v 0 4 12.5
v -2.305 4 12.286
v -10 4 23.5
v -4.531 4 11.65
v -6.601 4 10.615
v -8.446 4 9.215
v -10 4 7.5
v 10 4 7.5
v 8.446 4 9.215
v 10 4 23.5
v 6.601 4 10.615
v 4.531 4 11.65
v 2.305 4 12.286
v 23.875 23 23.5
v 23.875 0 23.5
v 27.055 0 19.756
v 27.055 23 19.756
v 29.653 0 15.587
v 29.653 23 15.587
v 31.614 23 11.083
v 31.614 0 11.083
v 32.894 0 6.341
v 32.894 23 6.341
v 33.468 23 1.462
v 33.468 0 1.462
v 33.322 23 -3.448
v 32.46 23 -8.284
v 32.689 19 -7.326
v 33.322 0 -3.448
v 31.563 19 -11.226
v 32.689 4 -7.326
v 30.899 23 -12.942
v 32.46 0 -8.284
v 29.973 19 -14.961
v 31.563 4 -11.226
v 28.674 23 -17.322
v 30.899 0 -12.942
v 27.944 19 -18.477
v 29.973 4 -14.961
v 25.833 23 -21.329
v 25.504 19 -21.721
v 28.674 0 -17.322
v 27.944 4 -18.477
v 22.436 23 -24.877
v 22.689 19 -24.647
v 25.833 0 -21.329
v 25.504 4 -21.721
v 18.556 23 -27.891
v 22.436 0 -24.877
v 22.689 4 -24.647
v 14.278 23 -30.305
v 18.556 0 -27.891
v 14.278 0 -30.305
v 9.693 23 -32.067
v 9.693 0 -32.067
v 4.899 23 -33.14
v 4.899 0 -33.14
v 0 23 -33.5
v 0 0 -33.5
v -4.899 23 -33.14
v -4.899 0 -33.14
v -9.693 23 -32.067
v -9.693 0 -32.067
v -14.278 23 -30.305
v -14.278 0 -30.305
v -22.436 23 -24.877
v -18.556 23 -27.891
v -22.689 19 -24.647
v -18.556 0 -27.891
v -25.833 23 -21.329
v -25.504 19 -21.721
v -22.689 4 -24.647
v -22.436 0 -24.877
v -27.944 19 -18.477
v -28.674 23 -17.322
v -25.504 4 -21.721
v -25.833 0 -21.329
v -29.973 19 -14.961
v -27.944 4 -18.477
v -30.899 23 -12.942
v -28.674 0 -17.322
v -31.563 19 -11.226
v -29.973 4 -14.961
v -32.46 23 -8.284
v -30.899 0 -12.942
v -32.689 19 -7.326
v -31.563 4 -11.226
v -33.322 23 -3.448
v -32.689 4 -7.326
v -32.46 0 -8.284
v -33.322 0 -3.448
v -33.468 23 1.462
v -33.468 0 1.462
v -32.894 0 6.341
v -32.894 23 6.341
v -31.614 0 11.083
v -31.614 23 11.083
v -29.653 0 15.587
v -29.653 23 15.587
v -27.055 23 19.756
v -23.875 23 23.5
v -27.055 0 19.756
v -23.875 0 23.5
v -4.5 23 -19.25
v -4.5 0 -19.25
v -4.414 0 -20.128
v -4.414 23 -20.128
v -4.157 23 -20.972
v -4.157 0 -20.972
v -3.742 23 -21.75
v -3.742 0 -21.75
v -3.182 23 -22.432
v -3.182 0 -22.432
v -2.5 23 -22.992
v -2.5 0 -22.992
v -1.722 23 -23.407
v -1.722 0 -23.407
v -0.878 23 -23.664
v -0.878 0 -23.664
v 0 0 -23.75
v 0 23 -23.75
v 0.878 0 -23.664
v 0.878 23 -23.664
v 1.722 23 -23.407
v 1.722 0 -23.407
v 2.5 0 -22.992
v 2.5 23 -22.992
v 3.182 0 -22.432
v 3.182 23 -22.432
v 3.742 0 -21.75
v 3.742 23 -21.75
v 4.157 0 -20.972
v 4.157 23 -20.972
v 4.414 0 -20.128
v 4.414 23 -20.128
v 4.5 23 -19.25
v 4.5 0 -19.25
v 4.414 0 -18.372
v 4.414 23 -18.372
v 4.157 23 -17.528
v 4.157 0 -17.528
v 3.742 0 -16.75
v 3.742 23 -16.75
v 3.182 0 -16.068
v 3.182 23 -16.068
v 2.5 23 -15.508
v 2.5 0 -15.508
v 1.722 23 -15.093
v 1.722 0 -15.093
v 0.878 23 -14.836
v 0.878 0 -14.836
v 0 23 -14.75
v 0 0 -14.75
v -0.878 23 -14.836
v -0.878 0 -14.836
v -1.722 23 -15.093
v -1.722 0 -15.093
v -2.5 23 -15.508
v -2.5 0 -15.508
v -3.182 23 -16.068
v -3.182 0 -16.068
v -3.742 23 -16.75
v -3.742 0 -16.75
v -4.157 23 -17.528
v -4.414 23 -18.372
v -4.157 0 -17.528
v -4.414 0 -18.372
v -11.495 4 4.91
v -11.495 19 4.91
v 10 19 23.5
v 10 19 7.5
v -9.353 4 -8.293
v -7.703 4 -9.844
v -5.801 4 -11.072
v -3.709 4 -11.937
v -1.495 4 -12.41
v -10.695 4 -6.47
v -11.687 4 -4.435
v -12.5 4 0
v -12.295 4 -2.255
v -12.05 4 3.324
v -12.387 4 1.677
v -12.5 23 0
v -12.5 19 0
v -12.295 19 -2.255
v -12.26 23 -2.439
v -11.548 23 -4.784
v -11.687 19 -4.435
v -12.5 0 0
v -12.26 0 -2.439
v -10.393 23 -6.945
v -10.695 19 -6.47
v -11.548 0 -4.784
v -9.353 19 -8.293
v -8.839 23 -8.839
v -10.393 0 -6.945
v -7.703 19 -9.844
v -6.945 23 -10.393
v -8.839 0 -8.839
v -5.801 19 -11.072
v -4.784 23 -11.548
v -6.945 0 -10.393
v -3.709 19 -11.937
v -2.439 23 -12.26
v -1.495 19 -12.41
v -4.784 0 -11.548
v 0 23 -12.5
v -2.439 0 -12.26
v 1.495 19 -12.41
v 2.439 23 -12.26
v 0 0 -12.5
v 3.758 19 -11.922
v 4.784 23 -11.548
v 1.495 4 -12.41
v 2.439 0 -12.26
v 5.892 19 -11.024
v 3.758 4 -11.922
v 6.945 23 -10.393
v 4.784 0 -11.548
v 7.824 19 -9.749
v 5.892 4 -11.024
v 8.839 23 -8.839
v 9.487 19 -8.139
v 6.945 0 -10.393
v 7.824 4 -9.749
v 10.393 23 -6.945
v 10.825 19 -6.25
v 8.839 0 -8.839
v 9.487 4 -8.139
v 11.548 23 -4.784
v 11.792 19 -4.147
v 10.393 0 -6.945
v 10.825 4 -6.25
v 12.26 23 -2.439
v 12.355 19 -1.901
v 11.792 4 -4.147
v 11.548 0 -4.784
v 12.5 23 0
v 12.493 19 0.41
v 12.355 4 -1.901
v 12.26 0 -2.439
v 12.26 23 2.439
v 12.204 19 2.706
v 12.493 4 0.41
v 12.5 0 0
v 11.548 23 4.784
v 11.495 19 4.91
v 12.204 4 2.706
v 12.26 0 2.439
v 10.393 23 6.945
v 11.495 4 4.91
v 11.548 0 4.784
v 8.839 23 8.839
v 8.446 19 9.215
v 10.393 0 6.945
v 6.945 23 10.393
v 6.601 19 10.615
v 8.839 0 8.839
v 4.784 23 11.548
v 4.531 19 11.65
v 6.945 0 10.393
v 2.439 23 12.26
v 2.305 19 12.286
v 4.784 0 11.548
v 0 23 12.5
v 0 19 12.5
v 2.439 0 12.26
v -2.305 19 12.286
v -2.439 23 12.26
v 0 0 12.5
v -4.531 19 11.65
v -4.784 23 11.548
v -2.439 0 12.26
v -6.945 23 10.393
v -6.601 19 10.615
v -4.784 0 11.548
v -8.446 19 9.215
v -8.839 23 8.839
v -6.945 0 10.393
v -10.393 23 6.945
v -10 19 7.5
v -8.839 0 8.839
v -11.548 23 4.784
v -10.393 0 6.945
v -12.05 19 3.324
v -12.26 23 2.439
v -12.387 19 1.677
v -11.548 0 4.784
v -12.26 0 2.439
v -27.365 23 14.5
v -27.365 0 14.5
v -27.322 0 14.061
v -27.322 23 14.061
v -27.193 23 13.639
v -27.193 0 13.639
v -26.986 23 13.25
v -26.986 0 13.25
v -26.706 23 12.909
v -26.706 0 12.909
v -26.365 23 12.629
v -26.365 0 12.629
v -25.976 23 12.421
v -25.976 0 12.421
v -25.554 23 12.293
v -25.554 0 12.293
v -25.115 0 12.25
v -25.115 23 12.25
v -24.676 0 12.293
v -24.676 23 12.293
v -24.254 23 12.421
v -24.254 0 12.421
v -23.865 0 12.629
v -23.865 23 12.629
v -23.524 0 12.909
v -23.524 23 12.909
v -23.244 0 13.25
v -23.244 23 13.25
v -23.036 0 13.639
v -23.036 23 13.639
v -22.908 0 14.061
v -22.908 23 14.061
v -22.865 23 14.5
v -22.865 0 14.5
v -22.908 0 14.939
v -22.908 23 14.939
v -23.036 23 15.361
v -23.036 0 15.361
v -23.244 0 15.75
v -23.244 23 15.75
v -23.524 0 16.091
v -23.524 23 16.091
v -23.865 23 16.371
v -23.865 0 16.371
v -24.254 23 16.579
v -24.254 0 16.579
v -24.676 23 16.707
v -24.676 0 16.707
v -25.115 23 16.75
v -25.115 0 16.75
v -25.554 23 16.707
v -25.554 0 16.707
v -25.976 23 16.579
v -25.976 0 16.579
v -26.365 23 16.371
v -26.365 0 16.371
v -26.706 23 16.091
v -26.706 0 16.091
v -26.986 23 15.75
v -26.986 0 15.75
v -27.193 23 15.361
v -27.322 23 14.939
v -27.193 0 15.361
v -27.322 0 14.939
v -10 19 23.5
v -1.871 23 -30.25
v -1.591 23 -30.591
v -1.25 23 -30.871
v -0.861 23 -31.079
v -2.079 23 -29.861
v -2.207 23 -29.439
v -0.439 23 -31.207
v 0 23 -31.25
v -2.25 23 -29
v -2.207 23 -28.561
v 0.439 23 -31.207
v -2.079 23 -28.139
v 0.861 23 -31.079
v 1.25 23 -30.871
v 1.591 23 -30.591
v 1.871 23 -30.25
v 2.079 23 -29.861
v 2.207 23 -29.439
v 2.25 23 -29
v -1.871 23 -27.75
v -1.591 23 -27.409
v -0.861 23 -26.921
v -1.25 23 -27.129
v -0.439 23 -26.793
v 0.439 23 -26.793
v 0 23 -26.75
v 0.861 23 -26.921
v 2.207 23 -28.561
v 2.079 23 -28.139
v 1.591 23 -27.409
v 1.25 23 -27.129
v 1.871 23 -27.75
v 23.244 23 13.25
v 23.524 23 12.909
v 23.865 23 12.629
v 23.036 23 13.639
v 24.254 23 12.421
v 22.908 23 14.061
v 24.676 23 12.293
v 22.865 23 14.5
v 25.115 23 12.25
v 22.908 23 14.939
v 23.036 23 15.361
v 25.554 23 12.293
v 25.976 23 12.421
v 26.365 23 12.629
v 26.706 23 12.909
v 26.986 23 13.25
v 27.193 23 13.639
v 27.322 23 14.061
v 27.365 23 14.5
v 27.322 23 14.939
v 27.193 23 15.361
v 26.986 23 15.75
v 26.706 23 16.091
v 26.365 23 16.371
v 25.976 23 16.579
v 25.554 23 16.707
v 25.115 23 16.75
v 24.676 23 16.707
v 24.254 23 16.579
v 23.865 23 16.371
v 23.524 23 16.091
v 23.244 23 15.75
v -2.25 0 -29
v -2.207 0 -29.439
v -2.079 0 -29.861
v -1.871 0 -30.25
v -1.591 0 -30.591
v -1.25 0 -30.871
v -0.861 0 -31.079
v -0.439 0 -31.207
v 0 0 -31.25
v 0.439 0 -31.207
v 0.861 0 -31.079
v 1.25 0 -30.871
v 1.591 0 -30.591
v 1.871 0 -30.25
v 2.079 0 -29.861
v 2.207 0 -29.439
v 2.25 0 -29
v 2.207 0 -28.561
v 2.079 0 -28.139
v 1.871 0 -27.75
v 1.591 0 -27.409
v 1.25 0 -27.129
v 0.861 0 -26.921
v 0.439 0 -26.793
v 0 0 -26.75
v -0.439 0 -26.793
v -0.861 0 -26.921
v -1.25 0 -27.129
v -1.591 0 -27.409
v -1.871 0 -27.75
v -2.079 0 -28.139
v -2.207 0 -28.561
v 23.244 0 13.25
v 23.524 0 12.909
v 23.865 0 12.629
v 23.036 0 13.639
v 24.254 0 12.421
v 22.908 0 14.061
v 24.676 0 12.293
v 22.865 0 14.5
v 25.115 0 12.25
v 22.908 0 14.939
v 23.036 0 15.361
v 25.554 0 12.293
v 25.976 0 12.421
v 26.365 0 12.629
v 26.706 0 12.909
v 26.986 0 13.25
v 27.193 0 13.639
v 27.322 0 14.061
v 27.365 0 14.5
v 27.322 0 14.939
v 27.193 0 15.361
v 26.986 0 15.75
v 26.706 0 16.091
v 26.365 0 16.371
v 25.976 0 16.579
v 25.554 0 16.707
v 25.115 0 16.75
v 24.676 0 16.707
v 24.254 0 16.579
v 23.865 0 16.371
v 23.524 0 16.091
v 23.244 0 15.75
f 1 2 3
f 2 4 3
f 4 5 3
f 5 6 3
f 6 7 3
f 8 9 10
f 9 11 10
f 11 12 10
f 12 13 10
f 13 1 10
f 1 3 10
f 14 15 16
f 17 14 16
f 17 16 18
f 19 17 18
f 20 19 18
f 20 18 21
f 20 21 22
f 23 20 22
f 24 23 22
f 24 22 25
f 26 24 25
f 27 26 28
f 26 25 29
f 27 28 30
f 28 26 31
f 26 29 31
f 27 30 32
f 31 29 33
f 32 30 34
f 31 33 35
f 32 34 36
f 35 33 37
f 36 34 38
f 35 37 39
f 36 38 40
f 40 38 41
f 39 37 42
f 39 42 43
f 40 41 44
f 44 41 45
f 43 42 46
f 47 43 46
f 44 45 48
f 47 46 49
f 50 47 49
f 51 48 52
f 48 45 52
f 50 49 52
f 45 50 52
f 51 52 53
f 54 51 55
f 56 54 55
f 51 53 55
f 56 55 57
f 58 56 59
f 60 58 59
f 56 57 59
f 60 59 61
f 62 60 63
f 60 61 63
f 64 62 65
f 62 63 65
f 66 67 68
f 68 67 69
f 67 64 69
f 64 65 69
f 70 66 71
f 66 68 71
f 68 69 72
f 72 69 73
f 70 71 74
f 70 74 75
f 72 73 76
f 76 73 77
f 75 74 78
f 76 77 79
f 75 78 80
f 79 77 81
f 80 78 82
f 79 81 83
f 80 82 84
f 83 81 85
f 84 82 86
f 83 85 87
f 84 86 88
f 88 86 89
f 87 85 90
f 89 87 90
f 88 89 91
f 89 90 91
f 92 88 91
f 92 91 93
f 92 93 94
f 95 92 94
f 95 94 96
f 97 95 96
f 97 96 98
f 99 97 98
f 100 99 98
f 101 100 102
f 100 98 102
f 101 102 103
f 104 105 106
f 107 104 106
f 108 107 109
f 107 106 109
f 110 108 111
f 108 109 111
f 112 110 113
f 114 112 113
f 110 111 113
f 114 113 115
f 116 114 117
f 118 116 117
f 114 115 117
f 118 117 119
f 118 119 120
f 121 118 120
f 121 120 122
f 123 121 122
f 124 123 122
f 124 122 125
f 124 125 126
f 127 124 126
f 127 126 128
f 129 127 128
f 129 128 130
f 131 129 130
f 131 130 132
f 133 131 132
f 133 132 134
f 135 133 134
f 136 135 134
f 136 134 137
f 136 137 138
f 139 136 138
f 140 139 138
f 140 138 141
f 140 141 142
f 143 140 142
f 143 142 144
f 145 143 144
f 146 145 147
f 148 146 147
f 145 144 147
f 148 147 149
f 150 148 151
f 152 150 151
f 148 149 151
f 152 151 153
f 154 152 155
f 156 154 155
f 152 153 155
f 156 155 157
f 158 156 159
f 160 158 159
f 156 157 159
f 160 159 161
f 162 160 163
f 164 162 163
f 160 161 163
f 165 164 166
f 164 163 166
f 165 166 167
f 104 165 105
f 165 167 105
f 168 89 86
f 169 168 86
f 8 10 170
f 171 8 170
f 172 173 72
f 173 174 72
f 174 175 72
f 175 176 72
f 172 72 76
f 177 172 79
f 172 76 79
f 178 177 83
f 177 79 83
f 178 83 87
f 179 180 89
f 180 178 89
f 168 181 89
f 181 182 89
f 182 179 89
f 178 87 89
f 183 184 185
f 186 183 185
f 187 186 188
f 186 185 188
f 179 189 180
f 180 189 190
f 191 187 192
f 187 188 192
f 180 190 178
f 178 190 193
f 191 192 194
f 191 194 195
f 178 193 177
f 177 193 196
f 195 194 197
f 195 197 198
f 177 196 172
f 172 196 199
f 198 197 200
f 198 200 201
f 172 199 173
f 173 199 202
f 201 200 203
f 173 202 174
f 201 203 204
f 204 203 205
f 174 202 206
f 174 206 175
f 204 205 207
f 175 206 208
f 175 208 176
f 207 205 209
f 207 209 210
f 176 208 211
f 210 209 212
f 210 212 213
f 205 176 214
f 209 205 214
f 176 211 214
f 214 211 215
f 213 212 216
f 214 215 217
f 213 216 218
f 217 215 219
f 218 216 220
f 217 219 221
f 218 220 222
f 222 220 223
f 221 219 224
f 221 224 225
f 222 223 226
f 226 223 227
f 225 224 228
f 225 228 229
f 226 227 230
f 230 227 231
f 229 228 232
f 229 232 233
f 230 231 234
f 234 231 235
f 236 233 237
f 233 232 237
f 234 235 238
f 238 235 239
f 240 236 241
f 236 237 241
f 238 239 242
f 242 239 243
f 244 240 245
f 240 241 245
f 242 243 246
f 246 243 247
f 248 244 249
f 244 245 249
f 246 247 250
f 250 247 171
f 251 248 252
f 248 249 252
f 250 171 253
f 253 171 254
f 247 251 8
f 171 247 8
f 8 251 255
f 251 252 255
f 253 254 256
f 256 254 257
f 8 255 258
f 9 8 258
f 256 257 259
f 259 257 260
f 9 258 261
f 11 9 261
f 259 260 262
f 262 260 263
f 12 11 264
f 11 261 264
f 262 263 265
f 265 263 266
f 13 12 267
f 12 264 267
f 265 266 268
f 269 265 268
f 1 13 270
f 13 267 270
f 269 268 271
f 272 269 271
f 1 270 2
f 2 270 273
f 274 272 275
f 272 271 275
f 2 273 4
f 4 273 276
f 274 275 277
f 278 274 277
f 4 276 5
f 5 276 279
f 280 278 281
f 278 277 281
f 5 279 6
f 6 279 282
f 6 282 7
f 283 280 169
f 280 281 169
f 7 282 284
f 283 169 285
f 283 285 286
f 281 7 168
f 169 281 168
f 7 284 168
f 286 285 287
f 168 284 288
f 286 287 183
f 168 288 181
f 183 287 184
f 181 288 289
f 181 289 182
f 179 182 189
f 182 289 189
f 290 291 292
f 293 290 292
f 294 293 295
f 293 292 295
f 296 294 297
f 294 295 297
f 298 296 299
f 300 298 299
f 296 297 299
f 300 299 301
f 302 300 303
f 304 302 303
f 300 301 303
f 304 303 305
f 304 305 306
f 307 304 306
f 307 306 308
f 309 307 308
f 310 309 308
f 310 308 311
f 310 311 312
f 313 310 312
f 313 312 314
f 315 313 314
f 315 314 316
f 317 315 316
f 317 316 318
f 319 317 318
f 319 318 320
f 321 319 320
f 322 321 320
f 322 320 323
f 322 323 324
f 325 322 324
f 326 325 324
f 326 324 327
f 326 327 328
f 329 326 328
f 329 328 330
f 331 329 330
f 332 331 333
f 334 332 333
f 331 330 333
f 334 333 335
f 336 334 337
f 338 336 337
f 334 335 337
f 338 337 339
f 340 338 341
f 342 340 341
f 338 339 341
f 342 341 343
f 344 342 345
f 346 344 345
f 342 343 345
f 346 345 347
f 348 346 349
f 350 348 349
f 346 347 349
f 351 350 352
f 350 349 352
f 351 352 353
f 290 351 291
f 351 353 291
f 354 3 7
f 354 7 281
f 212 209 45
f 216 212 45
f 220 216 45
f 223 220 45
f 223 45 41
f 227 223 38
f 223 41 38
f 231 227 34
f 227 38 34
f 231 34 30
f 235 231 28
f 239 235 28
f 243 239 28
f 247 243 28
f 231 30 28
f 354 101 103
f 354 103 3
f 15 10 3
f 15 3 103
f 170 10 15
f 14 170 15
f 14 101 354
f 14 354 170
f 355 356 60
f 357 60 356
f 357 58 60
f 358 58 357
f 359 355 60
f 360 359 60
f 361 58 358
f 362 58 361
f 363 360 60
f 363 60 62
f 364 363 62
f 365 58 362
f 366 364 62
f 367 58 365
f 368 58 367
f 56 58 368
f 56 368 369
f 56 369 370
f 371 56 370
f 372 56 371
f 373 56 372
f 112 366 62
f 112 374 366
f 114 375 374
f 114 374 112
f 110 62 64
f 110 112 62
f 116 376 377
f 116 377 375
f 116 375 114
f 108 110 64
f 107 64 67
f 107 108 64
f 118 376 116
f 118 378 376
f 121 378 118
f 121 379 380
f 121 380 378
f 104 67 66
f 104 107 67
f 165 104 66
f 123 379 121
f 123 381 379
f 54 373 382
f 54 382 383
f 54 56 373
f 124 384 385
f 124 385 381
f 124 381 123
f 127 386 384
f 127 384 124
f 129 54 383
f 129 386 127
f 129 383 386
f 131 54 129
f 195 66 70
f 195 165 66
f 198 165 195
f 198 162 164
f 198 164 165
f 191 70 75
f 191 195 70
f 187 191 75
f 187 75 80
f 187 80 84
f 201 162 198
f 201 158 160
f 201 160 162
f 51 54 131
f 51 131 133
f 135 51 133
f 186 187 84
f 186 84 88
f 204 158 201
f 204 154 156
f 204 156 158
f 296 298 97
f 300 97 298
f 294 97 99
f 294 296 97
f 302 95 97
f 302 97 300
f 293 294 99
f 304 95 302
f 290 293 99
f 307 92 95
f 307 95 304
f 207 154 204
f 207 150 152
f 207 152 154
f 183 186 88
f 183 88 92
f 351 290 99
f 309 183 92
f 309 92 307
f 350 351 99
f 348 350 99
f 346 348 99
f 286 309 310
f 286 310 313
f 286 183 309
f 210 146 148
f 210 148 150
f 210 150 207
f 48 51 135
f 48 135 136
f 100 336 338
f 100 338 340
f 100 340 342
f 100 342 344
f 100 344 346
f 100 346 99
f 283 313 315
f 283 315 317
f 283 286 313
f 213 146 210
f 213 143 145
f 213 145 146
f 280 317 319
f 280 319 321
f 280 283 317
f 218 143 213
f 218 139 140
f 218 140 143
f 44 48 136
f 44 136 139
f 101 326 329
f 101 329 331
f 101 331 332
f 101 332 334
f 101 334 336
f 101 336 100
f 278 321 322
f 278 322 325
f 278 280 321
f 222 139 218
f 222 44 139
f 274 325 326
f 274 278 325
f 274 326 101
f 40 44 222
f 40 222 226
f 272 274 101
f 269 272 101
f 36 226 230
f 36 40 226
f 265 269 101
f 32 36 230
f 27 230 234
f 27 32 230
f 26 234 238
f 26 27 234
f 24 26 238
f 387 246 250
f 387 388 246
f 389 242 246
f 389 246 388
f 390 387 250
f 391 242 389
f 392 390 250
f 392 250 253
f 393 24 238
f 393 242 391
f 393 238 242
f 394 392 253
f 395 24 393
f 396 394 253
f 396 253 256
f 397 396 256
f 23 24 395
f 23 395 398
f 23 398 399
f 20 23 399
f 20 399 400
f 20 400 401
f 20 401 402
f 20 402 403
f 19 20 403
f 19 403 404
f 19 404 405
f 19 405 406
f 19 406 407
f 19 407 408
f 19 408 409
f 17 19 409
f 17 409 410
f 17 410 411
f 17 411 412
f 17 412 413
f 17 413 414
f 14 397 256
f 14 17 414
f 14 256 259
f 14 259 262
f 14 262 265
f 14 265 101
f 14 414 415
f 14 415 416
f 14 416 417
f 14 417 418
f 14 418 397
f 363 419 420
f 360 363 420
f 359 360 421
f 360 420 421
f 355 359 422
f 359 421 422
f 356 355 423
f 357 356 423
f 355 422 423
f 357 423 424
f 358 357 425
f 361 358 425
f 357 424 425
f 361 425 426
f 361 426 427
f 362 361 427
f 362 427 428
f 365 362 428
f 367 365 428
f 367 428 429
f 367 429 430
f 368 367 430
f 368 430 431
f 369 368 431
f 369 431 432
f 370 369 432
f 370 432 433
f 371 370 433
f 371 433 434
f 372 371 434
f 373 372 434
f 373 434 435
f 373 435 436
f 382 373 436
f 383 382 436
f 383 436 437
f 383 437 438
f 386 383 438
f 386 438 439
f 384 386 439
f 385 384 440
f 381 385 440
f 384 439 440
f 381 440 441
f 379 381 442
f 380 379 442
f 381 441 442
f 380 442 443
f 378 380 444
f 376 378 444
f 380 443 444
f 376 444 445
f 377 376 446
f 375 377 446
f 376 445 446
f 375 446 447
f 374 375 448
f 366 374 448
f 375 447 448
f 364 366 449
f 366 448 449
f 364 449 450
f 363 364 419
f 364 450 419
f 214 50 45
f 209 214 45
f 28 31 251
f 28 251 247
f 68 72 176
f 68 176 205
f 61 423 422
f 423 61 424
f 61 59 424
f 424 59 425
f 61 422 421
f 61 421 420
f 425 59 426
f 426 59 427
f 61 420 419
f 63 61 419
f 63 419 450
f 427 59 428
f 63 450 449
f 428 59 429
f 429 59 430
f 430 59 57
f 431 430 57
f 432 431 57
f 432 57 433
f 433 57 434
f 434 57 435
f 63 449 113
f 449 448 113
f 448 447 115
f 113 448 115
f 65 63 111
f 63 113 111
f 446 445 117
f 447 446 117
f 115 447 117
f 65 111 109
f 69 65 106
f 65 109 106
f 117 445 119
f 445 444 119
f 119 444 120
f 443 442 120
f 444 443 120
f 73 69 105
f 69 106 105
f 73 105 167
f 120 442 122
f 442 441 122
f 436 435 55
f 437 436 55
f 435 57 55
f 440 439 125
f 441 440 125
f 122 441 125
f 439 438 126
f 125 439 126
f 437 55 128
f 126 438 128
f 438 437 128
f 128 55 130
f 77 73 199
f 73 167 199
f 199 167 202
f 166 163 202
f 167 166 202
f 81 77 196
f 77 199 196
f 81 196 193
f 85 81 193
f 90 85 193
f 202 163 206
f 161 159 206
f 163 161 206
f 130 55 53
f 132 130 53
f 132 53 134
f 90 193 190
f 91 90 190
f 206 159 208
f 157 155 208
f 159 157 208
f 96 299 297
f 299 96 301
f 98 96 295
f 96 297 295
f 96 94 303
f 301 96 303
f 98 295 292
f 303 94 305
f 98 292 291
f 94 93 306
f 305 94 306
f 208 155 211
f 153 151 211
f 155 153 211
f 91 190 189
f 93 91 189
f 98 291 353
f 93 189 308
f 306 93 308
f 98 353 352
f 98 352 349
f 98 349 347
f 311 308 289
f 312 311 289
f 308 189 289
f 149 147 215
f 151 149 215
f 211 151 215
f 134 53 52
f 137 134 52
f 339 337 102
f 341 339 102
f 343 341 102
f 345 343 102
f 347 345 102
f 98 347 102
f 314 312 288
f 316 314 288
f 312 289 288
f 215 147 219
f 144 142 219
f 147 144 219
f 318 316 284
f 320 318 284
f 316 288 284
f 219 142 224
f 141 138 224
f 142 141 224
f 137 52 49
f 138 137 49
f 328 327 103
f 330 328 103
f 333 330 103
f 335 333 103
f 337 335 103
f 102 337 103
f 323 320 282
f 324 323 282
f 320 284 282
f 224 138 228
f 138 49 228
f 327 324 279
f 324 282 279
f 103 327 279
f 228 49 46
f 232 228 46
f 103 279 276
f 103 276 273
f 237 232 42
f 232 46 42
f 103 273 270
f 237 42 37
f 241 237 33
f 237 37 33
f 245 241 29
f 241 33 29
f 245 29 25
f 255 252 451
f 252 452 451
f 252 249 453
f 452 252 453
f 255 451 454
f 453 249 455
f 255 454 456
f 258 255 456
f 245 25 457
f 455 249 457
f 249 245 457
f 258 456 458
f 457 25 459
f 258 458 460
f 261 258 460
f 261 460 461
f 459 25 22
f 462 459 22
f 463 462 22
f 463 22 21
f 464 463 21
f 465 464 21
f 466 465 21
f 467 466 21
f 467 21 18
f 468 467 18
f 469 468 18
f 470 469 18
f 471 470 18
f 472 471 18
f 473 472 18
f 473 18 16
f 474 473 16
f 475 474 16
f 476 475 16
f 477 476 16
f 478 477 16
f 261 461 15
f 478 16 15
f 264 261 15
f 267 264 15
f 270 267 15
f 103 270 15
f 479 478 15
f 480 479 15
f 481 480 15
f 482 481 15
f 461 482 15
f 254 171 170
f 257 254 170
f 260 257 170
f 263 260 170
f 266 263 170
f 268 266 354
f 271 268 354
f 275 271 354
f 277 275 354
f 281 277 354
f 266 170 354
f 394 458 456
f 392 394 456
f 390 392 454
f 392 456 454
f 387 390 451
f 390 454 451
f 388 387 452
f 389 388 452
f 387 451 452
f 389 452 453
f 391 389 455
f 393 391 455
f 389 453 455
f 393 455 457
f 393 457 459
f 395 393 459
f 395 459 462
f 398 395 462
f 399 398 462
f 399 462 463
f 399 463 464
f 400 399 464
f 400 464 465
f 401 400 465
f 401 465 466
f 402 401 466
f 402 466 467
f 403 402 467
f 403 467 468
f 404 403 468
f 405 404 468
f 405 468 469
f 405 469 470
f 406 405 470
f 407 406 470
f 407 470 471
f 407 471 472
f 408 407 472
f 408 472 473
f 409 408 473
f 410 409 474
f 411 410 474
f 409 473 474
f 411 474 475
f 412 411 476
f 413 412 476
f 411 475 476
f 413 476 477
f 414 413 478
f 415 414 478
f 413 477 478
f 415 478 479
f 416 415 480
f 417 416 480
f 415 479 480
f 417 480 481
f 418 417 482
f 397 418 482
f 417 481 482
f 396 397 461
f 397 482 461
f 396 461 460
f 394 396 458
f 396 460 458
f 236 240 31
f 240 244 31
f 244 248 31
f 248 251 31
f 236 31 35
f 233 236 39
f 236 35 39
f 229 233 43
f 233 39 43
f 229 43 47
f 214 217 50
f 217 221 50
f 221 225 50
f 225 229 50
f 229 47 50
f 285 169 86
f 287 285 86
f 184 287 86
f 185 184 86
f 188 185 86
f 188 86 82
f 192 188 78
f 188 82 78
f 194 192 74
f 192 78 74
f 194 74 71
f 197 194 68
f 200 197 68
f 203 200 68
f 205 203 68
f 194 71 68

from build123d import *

# Parameters (mm, degrees)
SKETCH_1_R               = 33.5
EXTRUDE_1_DEPTH          = 23
HOLE_WIZARD_1_D          = 4.5
HOLE_WIZARD_2_D          = 9
HOLE_WIZARD_3_D          = 25
SKETCH_9_W               = 10
SKETCH_9_H               = 15
CUT_EXTRUDE_1_DEPTH      = 30
PATTERN_CIRCULAR_1_COUNT = 3
SKETCH_10_W              = 67
SKETCH_10_H              = 23
CUT_EXTRUDE_2_DEPTH      = 10


with BuildPart() as part:
    # 草图1 → 凸台-拉伸1 (new body)
    with BuildSketch(Plane(origin=(0, 0, 0), x_dir=(1, 0, 0), z_dir=(0, 1, 0))):
        with Locations(Location((0, 0, 0), (0, 0, 270))):
            Circle(SKETCH_1_R)
    extrude(amount=EXTRUDE_1_DEPTH)

    # 孔1 (through all)
    with Locations(Plane(origin=(0, 23, 0), x_dir=(1, 0, 0), z_dir=(0, 1, 0))):
        with Locations((0, 29), (-25.11473671, -14.5), (25.11473671, -14.5)):
            Hole(HOLE_WIZARD_1_D / 2)

    # 孔2 (through all)
    with Locations(Plane(origin=(0, 23, 0), x_dir=(1, 0, 0), z_dir=(0, 1, 0))):
        with Locations((0, 19.25)):
            Hole(HOLE_WIZARD_2_D / 2)

    # 孔3 (through all)
    with Locations(Plane(origin=(0, 23, 0), x_dir=(1, 0, 0), z_dir=(0, 1, 0))):
        with Locations((0, 0)):
            Hole(HOLE_WIZARD_3_D / 2)

    # 草图9 → 切除-拉伸1 (cut)
    with BuildSketch(Plane.XY.offset(33.5)):
        with Locations((5, 11.5)):
            Rectangle(SKETCH_9_W, SKETCH_9_H)
        with Locations((-5, 11.5)):
            Rectangle(SKETCH_9_W, SKETCH_9_H)
    cut_extrude_1 = extrude(amount=-CUT_EXTRUDE_1_DEPTH, mode=Mode.SUBTRACT)

    # 阵列(圆周)1: 切除-拉伸1 ×3 about axis
    pattern_circular_1_axis = Axis((0, 0, 0), (0, 1, 0))
    for i in range(1, PATTERN_CIRCULAR_1_COUNT):
        add(cut_extrude_1.rotate(pattern_circular_1_axis, i * 360 / PATTERN_CIRCULAR_1_COUNT), mode=Mode.SUBTRACT)

    # 草图10 → 切除-拉伸2 (cut)
    with BuildSketch(Plane.XY.offset(33.5)):
        with Locations((0, 11.5)):
            Rectangle(SKETCH_10_W, SKETCH_10_H)
    extrude(amount=-CUT_EXTRUDE_2_DEPTH, mode=Mode.SUBTRACT)


solid = part.part
